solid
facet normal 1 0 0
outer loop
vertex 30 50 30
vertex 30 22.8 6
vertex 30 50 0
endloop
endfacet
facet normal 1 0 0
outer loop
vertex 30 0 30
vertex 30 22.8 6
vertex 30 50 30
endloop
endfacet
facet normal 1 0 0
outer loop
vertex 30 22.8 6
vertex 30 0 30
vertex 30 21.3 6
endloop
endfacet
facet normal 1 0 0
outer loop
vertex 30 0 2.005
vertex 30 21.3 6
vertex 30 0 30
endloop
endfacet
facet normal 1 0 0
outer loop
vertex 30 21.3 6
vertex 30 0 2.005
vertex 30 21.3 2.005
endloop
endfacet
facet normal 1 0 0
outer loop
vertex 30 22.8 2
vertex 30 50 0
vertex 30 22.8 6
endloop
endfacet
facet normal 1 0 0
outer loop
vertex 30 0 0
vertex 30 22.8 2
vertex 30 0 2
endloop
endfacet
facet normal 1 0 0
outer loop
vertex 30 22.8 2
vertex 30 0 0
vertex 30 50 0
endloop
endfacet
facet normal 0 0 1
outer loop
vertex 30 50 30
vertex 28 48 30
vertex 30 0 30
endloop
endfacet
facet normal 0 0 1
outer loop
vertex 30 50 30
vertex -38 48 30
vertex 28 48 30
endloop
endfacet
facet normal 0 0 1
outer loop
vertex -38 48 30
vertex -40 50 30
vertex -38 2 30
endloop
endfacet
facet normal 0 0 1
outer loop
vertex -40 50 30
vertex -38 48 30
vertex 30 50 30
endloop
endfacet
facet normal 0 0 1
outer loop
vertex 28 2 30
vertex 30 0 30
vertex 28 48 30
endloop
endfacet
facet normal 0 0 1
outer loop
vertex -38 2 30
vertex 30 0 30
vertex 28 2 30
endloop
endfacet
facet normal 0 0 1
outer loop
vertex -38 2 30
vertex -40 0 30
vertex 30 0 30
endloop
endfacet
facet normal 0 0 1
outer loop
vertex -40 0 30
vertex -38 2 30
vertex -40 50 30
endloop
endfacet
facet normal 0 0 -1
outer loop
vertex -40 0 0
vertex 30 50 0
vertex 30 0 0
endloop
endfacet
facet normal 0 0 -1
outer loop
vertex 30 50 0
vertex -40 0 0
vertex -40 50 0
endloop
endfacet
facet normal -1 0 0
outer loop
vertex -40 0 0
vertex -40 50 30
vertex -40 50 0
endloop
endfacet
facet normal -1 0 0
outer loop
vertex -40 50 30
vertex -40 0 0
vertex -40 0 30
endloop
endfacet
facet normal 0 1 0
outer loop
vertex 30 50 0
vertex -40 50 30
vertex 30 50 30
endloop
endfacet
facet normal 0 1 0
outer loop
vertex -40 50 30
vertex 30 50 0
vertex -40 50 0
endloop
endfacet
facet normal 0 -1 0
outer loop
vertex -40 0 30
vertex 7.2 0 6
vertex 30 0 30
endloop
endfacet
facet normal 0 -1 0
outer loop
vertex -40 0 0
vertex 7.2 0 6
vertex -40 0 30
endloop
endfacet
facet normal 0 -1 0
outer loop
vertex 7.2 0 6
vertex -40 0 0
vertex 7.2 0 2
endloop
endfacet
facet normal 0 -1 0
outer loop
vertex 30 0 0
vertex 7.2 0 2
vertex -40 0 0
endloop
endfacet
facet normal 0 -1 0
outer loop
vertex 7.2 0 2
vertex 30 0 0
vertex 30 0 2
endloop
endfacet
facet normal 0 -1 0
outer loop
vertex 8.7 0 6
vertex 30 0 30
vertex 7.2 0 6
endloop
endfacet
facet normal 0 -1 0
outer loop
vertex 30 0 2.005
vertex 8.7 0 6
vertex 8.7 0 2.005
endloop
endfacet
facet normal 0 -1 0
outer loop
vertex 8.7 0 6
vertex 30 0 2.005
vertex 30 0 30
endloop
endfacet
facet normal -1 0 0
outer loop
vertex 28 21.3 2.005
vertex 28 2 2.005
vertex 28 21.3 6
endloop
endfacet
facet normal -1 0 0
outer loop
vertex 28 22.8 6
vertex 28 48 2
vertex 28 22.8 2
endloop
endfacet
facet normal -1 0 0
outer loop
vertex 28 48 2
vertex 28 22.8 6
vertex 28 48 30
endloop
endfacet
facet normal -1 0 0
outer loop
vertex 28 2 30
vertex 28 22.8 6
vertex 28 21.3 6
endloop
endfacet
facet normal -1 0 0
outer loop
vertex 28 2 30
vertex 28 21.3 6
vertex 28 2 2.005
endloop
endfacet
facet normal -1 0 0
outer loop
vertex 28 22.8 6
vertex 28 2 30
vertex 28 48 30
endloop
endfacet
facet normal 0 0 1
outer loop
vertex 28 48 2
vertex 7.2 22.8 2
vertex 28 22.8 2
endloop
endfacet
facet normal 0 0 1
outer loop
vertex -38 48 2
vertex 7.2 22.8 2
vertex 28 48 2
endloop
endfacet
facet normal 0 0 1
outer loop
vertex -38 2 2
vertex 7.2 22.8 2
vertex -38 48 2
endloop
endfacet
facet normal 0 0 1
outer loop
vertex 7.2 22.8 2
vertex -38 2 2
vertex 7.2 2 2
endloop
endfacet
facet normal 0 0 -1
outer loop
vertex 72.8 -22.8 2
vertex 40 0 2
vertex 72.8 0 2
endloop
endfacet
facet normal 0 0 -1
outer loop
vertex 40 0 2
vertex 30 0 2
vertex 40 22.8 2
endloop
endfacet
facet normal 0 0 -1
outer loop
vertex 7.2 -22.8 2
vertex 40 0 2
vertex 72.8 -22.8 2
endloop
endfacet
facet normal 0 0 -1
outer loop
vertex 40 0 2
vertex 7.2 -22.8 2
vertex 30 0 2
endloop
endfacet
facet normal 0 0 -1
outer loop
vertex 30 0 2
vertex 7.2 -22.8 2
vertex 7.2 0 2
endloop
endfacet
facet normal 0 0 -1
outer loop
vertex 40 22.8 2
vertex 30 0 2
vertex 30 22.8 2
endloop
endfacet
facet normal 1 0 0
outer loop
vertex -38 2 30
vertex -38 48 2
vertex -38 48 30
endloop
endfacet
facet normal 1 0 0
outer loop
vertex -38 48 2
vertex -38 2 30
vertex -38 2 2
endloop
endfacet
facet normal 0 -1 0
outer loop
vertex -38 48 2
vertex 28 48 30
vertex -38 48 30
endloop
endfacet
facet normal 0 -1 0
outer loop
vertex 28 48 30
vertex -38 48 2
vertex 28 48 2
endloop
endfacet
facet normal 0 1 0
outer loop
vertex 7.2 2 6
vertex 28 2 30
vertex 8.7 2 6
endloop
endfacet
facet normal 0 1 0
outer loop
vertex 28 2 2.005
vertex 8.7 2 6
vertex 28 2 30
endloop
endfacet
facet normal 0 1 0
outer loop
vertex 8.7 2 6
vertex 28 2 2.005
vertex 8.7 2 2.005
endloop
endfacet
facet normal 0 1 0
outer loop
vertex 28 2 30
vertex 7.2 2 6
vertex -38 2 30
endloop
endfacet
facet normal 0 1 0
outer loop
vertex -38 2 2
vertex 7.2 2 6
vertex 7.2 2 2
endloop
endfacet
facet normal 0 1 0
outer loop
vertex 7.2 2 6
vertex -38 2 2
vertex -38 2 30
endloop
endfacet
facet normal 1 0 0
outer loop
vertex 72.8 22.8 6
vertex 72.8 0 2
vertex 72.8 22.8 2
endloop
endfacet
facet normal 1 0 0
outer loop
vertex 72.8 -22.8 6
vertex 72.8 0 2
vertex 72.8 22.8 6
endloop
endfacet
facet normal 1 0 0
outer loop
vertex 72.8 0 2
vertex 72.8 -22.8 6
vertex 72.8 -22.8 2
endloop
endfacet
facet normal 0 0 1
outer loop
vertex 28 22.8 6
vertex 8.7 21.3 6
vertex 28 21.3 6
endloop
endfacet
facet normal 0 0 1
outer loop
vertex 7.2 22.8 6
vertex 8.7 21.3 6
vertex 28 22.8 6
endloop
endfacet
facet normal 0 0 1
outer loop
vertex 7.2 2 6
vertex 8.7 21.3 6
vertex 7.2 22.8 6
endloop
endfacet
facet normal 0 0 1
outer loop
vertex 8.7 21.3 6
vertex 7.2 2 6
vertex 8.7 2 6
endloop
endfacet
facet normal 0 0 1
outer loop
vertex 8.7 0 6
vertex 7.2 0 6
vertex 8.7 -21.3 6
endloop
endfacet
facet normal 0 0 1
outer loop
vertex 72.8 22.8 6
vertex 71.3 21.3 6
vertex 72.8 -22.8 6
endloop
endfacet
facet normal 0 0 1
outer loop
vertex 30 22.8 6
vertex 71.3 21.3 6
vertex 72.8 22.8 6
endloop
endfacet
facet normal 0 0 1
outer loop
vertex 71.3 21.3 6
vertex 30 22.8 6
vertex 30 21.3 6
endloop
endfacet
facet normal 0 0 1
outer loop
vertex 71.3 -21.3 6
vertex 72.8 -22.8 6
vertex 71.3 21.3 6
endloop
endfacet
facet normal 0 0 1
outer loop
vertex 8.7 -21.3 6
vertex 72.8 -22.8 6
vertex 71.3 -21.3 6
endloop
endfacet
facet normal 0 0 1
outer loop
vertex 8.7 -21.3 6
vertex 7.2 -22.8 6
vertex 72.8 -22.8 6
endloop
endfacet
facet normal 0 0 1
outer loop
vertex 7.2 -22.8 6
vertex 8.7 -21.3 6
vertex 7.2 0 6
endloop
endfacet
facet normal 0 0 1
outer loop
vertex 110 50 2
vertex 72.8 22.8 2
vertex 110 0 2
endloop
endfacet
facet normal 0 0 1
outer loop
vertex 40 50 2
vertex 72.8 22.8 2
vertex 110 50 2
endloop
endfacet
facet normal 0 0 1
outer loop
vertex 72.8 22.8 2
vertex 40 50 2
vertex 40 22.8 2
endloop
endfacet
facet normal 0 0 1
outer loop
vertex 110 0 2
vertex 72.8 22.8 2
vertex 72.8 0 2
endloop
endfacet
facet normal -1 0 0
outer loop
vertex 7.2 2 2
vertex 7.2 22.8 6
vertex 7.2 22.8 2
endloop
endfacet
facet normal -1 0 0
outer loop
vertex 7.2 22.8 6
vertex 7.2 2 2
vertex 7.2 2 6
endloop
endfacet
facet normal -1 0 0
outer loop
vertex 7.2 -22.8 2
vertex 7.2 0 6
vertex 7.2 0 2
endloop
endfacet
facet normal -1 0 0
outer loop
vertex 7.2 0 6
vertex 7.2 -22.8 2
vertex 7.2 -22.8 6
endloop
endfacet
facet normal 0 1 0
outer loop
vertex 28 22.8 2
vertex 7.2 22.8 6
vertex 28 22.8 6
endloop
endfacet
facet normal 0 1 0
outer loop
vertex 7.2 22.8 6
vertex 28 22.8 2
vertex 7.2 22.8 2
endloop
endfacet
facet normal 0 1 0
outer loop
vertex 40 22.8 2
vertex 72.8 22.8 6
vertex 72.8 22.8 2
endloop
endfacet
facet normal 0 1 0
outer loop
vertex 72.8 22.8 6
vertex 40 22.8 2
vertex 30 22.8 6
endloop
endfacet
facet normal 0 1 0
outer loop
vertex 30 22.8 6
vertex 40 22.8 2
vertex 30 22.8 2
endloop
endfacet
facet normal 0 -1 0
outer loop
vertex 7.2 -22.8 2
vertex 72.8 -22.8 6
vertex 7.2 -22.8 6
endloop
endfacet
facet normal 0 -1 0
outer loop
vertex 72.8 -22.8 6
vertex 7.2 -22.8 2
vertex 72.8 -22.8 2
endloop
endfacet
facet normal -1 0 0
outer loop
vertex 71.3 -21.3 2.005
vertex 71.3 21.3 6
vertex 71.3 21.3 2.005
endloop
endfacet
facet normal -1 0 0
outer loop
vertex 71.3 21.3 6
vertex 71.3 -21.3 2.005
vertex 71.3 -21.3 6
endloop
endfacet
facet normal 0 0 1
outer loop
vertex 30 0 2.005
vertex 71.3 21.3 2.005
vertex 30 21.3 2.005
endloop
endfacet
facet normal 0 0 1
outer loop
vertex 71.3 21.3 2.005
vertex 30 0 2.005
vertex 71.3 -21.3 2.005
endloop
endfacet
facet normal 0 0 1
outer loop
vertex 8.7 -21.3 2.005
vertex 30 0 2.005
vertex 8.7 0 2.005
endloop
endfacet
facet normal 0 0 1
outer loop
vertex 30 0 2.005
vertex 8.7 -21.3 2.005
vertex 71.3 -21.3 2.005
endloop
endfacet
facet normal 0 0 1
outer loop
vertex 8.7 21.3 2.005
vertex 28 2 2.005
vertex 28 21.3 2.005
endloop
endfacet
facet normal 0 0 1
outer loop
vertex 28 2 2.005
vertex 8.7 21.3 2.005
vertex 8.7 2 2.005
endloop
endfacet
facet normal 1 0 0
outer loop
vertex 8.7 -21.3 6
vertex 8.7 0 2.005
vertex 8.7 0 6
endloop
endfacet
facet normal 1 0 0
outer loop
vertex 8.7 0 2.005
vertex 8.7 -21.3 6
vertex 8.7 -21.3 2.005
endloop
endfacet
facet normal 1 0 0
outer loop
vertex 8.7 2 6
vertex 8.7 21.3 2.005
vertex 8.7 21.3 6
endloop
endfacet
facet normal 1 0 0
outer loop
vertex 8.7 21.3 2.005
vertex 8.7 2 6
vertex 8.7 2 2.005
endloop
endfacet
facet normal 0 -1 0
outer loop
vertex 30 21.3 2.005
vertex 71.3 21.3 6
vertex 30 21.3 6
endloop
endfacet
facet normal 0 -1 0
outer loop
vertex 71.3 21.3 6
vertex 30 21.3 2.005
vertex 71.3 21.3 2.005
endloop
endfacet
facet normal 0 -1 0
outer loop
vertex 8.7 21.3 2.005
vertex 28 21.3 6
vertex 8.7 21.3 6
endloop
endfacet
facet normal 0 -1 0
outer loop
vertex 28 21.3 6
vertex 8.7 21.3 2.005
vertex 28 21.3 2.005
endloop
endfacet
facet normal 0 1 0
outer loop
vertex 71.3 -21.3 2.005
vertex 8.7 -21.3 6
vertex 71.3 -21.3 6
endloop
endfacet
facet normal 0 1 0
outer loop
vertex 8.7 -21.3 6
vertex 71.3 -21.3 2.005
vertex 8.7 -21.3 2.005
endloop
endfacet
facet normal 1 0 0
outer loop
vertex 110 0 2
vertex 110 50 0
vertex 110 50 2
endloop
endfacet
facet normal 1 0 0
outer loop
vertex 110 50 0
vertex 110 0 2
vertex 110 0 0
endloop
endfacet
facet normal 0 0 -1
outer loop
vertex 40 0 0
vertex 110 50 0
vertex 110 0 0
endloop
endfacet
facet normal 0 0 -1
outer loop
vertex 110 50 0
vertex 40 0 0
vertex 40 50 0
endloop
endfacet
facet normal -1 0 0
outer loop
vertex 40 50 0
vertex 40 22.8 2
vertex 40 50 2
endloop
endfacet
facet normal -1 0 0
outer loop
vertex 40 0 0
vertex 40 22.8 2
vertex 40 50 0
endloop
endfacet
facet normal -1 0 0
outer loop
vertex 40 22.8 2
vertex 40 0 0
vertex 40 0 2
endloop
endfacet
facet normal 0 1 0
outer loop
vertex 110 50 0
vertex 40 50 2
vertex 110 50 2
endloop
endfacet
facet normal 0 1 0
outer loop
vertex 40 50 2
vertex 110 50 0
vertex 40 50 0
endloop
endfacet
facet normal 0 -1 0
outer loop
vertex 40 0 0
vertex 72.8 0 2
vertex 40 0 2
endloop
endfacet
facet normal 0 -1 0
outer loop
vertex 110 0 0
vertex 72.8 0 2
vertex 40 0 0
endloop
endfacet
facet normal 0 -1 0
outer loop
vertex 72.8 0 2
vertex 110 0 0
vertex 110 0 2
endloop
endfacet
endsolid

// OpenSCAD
$fn = 64;

// --- Box Dimensions ---
BOX_OUT_X = 70;   // Outer length (X)
BOX_OUT_Y = 50;   // Outer width (Y)
BOX_OUT_Z = 30;   // Outer height (Z)
WALL_THK  = 2;    // Wall thickness
FLOOR_THK = 2;    // Floor thickness
BOX_IN_X  = BOX_OUT_X - 2 * WALL_THK; // Inner length
BOX_IN_Y  = BOX_OUT_Y - 2 * WALL_THK; // Inner width
BOX_IN_Z  = BOX_OUT_Z - FLOOR_THK;    // Inner height

// --- Lid Dimensions ---
LID_PLATE_X = 70;   // Plate length (X)
LID_PLATE_Y = 50;   // Plate width (Y)
LID_PLATE_Z = 2;    // Plate thickness (Z)
LIP_OUT_X   = 65.6; // Lip outer length (X)
LIP_OUT_Y   = 45.6; // Lip outer width (Y)
LIP_THK     = 1.5;  // Lip wall thickness
LIP_H       = 4;    // Lip height
LIP_IN_X    = LIP_OUT_X - 2 * LIP_THK; // Lip inner length
LIP_IN_Y    = LIP_OUT_Y - 2 * LIP_THK; // Lip inner width

// --- Part 1: Box ---
translate([-40, 0, 0]) {
    difference() {
        // Solid block before hollowing
        cube([BOX_OUT_X, BOX_OUT_Y, BOX_OUT_Z]);
        // Hollow cutout: leaves 2mm walls and floor. Extends 0.02mm past top face.
        translate([WALL_THK, WALL_THK, FLOOR_THK])
            cube([BOX_IN_X, BOX_IN_Y, BOX_IN_Z + 0.02]);
    }
}

// --- Part 2: Lid ---
translate([40, 0, 0]) {
    union() {
        // Base plate
        cube([LID_PLATE_X, LID_PLATE_Y, LID_PLATE_Z]);
        
        // Lip (printed upside down, so it sits on top of the plate)
        difference() {
            // Outer lip block
            translate([-LIP_OUT_X/2, -LIP_OUT_Y/2, LID_PLATE_Z])
                cube([LIP_OUT_X, LIP_OUT_Y, LIP_H]);
            // Inner cutout: extends 0.02mm past the top face of the lip
            translate([-LIP_IN_X/2, -LIP_IN_Y/2, LID_PLATE_Z + 0.005])
                cube([LIP_IN_X, LIP_IN_Y, LIP_H + 0.02]);
        }
    }
}
